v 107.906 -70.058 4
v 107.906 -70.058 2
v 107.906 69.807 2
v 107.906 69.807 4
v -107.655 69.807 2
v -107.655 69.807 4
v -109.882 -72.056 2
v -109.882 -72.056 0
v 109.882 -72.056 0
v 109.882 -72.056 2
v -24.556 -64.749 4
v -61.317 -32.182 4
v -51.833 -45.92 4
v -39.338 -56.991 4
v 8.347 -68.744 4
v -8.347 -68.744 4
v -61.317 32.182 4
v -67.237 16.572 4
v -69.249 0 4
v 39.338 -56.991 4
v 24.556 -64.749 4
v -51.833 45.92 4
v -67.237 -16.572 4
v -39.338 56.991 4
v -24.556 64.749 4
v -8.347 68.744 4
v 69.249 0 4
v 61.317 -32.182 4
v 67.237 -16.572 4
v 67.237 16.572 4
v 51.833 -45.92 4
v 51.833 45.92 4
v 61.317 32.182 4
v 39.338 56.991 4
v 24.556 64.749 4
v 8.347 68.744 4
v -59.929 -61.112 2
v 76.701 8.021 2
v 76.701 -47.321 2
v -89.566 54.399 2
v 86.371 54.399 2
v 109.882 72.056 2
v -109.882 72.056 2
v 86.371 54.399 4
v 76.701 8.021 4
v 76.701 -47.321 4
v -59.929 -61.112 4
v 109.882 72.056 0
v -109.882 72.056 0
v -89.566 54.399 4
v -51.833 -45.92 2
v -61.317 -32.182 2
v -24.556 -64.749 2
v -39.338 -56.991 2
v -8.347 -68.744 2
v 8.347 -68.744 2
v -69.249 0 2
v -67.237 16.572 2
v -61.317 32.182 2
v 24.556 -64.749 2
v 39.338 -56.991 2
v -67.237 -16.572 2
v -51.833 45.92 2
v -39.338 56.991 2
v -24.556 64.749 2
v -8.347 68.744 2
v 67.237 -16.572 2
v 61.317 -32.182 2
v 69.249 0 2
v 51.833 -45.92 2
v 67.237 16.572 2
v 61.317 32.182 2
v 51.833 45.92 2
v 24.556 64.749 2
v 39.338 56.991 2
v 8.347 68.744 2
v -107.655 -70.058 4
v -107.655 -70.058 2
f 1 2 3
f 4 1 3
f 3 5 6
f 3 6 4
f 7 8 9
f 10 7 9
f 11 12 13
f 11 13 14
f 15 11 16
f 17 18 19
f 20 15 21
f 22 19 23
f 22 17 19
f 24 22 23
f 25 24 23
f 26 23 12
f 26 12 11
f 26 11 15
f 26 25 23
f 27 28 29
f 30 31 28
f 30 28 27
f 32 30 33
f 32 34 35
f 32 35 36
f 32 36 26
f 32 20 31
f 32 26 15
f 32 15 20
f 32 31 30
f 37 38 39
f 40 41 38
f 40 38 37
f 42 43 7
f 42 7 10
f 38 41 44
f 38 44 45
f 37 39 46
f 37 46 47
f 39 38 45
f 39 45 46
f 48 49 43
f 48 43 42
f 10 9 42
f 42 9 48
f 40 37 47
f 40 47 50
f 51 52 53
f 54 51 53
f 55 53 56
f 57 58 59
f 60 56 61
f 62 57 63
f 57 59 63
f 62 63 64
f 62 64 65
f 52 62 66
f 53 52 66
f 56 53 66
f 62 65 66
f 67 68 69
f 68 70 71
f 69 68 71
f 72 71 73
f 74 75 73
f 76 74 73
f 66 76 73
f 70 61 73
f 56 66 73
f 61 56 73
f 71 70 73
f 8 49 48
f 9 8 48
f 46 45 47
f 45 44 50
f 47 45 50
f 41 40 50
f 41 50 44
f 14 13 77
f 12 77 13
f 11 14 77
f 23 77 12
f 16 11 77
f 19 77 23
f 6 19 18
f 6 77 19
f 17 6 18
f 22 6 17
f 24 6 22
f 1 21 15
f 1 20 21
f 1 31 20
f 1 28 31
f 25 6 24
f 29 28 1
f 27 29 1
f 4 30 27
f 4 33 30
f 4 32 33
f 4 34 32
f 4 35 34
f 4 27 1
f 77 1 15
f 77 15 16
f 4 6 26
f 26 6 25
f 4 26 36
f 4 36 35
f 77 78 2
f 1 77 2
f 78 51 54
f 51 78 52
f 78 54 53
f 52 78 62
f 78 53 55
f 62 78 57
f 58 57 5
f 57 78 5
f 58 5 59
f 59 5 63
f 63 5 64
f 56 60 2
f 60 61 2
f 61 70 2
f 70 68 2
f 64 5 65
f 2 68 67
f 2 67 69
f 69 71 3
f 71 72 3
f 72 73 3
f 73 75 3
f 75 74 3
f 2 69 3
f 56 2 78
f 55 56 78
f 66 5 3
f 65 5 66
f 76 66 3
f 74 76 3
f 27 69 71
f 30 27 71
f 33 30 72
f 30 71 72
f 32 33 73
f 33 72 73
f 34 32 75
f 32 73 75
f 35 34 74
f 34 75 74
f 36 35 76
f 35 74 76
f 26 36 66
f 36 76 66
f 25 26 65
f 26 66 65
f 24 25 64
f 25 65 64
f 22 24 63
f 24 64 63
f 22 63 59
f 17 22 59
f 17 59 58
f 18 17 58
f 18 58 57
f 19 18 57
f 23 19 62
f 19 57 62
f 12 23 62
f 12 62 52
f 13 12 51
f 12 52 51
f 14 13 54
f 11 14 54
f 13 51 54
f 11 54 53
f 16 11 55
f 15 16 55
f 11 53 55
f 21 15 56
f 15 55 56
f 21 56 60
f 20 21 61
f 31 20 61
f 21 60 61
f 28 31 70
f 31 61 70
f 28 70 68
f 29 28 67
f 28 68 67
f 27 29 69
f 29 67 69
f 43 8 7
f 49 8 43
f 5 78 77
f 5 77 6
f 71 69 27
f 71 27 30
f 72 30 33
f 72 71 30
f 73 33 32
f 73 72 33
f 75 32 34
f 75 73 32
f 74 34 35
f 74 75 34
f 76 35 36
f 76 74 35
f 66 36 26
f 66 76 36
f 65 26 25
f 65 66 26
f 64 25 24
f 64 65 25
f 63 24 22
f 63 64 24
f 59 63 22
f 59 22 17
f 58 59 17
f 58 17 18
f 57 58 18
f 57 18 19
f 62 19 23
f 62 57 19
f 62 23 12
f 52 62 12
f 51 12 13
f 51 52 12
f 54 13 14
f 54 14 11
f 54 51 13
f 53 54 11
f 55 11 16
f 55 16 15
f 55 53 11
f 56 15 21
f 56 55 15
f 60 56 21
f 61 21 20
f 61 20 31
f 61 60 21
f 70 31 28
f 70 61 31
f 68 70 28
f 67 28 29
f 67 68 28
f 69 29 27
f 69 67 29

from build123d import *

# Parameters (mm, degrees)
SKETCH1_W           = 219.763537348
SKETCH1_H           = 144.111604492
BOSS_EXTRUDE1_DEPTH = 2
BOSS_EXTRUDE2_DEPTH = 2
SKETCH3_W           = 215.561595081
SKETCH3_H           = 139.864383785
BOSS_EXTRUDE3_DEPTH = 2
SKETCH4_R           = 69.248780579
BOSS_EXTRUDE5_DEPTH = 2
SKETCH4_2_R         = 69.248780579
CUT_EXTRUDE3_DEPTH  = 2


with BuildPart() as part:
    # Sketch1 → Boss-Extrude1 (new body)
    with BuildSketch(Plane.XY):
        Rectangle(SKETCH1_W, SKETCH1_H)
    extrude(amount=BOSS_EXTRUDE1_DEPTH)


with BuildPart() as body_2:
    # Sketch2 → Boss-Extrude2 (new body)
    with BuildSketch(Plane.XY.offset(2)):
        Polygon((-89.566144192, 54.398549486), (86.371391829, 54.398549486), (76.70074348, 8.020636875), (76.70074348, -47.321076556), (-59.92940692, -61.112256167), align=None)
    extrude(amount=BOSS_EXTRUDE2_DEPTH)


with BuildPart() as body_3:
    # Sketch3 → Boss-Extrude3 (new body)
    with BuildSketch(Plane.XY.offset(2)):
        with Locations((0.125326509, -0.125326509)):
            Rectangle(SKETCH3_W, SKETCH3_H)
    extrude(amount=BOSS_EXTRUDE3_DEPTH)

    # Sketch4<2> → Cut-Extrude3 (cut)
    with BuildSketch(Plane.XY.offset(2)):
        Circle(SKETCH4_2_R)
    extrude(amount=CUT_EXTRUDE3_DEPTH, mode=Mode.SUBTRACT)


with BuildPart() as body_4:
    # Sketch4 → Boss-Extrude5 (new body)
    with BuildSketch(Plane.XY.offset(2)):
        Circle(SKETCH4_R)
    extrude(amount=BOSS_EXTRUDE5_DEPTH)


solid = Compound([part.part, body_2.part, body_3.part, body_4.part])
